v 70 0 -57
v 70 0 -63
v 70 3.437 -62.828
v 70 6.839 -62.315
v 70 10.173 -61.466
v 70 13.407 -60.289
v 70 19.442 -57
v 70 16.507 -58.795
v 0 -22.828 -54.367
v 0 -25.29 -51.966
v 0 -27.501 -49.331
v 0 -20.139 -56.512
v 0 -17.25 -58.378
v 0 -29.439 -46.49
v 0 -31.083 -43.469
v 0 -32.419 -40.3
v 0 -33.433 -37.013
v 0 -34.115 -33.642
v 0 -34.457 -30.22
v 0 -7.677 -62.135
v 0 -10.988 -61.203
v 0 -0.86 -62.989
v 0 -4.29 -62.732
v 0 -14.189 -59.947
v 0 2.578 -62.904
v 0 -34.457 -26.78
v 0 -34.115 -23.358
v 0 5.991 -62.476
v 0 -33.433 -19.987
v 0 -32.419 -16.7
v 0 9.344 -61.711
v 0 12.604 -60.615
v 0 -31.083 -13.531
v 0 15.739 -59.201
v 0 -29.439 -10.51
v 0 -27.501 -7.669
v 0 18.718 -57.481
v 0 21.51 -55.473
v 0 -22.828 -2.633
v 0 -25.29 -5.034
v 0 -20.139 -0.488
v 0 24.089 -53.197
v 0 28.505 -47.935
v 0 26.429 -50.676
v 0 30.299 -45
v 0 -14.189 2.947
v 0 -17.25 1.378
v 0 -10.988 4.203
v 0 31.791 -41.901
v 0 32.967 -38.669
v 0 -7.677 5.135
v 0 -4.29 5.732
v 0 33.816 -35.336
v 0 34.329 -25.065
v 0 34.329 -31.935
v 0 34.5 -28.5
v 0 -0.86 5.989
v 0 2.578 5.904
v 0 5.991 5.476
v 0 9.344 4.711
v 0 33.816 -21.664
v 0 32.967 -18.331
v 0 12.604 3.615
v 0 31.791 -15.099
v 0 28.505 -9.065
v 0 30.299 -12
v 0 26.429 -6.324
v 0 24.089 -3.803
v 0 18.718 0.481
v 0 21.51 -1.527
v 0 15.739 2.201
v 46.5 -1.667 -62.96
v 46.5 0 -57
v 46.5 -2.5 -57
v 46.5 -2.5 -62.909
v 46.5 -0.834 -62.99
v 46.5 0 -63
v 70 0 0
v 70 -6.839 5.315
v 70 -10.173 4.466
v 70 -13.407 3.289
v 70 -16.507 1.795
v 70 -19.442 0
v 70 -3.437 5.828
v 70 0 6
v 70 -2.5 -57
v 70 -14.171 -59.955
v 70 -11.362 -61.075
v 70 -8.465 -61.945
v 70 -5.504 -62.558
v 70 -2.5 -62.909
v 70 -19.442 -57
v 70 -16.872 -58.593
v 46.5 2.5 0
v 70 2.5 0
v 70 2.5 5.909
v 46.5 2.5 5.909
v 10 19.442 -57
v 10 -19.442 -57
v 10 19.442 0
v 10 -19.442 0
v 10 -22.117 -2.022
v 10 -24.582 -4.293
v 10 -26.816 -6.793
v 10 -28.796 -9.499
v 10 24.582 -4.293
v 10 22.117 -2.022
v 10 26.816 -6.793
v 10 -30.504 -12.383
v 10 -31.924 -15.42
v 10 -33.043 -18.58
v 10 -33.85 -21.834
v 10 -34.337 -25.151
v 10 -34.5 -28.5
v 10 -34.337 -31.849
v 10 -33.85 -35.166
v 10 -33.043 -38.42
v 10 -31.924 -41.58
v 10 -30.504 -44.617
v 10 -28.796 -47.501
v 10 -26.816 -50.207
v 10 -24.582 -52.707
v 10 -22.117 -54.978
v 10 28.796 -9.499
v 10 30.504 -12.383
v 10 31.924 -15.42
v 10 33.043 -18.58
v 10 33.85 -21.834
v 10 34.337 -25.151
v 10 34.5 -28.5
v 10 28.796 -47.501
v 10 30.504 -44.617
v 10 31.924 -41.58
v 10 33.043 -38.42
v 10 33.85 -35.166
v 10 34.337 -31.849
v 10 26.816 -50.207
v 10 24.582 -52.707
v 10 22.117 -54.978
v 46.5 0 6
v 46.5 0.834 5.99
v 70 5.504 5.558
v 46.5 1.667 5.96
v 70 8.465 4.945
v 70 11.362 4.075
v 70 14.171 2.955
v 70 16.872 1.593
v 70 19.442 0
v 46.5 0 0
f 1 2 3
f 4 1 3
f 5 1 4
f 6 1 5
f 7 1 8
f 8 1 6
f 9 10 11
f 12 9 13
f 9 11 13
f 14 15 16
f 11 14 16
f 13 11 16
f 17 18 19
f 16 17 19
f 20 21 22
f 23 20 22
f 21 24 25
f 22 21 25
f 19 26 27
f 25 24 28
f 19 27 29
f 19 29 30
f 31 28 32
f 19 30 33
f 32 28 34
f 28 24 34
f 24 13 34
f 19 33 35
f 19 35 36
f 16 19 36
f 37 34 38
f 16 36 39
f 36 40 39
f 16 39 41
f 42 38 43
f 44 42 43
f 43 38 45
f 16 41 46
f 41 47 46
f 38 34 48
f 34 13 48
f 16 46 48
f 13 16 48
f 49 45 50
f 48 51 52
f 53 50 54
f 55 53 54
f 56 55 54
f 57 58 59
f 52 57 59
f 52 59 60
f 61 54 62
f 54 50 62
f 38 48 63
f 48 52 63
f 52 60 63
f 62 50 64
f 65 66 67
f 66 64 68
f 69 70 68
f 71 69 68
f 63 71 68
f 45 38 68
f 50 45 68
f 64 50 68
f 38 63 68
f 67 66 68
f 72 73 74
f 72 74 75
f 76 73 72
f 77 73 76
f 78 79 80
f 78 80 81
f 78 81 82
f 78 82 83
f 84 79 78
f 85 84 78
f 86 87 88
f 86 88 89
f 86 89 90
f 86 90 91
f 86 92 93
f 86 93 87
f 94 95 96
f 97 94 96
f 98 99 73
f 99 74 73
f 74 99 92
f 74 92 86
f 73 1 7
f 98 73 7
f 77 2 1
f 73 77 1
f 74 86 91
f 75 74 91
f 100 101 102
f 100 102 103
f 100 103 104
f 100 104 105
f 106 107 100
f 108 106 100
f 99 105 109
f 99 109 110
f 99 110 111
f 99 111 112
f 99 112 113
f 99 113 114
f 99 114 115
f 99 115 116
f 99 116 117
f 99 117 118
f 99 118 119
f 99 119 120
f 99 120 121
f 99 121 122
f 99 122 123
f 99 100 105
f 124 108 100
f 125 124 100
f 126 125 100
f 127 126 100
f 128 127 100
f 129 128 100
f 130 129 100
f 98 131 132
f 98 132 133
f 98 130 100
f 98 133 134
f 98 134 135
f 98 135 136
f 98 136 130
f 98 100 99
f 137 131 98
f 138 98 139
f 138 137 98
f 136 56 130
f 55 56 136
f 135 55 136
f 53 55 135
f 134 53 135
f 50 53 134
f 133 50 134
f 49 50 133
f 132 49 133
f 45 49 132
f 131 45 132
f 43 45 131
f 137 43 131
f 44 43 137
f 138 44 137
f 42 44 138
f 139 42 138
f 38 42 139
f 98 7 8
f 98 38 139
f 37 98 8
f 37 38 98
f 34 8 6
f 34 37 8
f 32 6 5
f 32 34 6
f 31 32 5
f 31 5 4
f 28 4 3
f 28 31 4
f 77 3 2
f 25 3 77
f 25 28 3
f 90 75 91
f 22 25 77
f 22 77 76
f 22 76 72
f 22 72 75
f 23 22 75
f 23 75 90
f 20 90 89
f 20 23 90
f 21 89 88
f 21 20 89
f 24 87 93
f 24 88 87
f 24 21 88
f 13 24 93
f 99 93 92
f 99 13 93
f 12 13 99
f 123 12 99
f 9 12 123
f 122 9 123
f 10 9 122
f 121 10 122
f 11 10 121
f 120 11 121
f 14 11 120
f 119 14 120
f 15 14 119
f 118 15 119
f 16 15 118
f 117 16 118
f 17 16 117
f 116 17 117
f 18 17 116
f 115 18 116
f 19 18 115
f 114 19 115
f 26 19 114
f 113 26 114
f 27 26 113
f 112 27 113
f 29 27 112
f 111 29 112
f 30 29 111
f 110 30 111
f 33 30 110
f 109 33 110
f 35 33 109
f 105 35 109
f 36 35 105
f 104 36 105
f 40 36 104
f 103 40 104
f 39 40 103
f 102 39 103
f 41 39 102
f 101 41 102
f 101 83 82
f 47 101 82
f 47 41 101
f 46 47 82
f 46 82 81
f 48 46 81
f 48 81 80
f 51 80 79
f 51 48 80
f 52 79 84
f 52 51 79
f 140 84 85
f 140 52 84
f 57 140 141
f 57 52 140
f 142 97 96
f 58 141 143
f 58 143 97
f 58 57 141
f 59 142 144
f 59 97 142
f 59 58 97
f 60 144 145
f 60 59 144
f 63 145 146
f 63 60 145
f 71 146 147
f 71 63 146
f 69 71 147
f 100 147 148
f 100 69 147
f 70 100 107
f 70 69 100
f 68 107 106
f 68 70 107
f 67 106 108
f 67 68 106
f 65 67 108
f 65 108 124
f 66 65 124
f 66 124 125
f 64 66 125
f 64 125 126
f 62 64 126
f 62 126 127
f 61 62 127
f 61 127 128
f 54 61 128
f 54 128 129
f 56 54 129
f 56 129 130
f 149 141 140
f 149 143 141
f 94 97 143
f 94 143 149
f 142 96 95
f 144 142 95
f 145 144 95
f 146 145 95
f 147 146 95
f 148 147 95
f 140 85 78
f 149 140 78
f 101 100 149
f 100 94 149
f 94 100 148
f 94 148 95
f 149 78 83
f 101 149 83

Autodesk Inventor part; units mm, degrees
ref_plane "YZ Plane" through (0, 0, 0) normal (1, 0, 0) x (0, 1, 0)
ref_plane "XZ Plane" through (0, 0, 0) normal (0, 1, 0) x (-1, 0, 0)
ref_plane "XY Plane" through (0, 0, 0) normal (0, 0, 1) x (1, 0, 0)
sketch "Sketch1" plane through (0, 0, 0) normal (1, 0, 0) x (0, 1, 0)
  circle A0 centre (0, -28.5) radius 34.5
  point P0 (0, 0)
extrude "Extrusion1" add sketch "Sketch1" along normal blind 70
sketch "Sketch2" plane through (70, 0, -28.5) normal (1, 0, 0) x (0, 0, -1)
  line L0 (-28.5, 0) -> (-28.5, 19.4422)
  circle A0 centre (0, 0) radius 34.5 projected
  line L1 (-28.5, 0) -> (-28.5, -19.4422)
  line L2 (28.5, 0) -> (28.5, 19.4422)
  line L3 (28.5, 0) -> (28.5, -19.4422)
  arc A1 (-28.5, 19.4422) -> (-28.5, -19.4422) centre (0, 0) ccw
  arc A2 (28.5, -19.4422) -> (28.5, 19.4422) centre (0, 0) ccw
  arc A3 (28.5, 19.4422) -> (-28.5, 19.4422) centre (0, 0) ccw
  arc A4 (-28.5, -19.4422) -> (28.5, -19.4422) centre (0, 0) ccw
extrude "Extrusion2" cut sketch "Sketch2" against normal blind 60 contours L0 A0 L2 L3 L1
sketch "Sketch3" plane through (70, 0, 0) normal (1, 0, 0) x (0, 0, -1)
  line L0 (0, 0) -> (0, 1.25)
  circle A0 centre (28.5, 0) radius 34.5 projected
  line L1 (28.5, 0) -> (28.5, 34.5)
  line L2 (0, 1.25) -> (0, 2.5)
  line L3 (0, -19.4422) -> (0, 19.4422) projected
  line L4 (0, 2.5) -> (-6.2328, 2.5)
  line L5 (-6.2328, 2.5) -> (-6.2328, 0)
  line L6 (-6.2328, 0) -> (0, 0)
  line L7 (57, 19.4422) -> (57, -19.4422) projected
  line L8 (57, 0) -> (57, -2.5)
  line L9 (57, -2.5) -> (63.7144, -2.5)
  line L10 (63.7144, -2.5) -> (63.7144, 0)
  line L11 (63.7144, 0) -> (57, 0)
  dimension "d9" = 1.25
  dimension "d10" = 2.5
extrude "Extrusion3" cut sketch "Sketch3" against normal blind 23.5 contours L6 A0 L4 L2 L0 | L6 L5 L4 A0 | L9 L7 L11 A0 | A0 L11 L10 L9
properties part number "Base"
